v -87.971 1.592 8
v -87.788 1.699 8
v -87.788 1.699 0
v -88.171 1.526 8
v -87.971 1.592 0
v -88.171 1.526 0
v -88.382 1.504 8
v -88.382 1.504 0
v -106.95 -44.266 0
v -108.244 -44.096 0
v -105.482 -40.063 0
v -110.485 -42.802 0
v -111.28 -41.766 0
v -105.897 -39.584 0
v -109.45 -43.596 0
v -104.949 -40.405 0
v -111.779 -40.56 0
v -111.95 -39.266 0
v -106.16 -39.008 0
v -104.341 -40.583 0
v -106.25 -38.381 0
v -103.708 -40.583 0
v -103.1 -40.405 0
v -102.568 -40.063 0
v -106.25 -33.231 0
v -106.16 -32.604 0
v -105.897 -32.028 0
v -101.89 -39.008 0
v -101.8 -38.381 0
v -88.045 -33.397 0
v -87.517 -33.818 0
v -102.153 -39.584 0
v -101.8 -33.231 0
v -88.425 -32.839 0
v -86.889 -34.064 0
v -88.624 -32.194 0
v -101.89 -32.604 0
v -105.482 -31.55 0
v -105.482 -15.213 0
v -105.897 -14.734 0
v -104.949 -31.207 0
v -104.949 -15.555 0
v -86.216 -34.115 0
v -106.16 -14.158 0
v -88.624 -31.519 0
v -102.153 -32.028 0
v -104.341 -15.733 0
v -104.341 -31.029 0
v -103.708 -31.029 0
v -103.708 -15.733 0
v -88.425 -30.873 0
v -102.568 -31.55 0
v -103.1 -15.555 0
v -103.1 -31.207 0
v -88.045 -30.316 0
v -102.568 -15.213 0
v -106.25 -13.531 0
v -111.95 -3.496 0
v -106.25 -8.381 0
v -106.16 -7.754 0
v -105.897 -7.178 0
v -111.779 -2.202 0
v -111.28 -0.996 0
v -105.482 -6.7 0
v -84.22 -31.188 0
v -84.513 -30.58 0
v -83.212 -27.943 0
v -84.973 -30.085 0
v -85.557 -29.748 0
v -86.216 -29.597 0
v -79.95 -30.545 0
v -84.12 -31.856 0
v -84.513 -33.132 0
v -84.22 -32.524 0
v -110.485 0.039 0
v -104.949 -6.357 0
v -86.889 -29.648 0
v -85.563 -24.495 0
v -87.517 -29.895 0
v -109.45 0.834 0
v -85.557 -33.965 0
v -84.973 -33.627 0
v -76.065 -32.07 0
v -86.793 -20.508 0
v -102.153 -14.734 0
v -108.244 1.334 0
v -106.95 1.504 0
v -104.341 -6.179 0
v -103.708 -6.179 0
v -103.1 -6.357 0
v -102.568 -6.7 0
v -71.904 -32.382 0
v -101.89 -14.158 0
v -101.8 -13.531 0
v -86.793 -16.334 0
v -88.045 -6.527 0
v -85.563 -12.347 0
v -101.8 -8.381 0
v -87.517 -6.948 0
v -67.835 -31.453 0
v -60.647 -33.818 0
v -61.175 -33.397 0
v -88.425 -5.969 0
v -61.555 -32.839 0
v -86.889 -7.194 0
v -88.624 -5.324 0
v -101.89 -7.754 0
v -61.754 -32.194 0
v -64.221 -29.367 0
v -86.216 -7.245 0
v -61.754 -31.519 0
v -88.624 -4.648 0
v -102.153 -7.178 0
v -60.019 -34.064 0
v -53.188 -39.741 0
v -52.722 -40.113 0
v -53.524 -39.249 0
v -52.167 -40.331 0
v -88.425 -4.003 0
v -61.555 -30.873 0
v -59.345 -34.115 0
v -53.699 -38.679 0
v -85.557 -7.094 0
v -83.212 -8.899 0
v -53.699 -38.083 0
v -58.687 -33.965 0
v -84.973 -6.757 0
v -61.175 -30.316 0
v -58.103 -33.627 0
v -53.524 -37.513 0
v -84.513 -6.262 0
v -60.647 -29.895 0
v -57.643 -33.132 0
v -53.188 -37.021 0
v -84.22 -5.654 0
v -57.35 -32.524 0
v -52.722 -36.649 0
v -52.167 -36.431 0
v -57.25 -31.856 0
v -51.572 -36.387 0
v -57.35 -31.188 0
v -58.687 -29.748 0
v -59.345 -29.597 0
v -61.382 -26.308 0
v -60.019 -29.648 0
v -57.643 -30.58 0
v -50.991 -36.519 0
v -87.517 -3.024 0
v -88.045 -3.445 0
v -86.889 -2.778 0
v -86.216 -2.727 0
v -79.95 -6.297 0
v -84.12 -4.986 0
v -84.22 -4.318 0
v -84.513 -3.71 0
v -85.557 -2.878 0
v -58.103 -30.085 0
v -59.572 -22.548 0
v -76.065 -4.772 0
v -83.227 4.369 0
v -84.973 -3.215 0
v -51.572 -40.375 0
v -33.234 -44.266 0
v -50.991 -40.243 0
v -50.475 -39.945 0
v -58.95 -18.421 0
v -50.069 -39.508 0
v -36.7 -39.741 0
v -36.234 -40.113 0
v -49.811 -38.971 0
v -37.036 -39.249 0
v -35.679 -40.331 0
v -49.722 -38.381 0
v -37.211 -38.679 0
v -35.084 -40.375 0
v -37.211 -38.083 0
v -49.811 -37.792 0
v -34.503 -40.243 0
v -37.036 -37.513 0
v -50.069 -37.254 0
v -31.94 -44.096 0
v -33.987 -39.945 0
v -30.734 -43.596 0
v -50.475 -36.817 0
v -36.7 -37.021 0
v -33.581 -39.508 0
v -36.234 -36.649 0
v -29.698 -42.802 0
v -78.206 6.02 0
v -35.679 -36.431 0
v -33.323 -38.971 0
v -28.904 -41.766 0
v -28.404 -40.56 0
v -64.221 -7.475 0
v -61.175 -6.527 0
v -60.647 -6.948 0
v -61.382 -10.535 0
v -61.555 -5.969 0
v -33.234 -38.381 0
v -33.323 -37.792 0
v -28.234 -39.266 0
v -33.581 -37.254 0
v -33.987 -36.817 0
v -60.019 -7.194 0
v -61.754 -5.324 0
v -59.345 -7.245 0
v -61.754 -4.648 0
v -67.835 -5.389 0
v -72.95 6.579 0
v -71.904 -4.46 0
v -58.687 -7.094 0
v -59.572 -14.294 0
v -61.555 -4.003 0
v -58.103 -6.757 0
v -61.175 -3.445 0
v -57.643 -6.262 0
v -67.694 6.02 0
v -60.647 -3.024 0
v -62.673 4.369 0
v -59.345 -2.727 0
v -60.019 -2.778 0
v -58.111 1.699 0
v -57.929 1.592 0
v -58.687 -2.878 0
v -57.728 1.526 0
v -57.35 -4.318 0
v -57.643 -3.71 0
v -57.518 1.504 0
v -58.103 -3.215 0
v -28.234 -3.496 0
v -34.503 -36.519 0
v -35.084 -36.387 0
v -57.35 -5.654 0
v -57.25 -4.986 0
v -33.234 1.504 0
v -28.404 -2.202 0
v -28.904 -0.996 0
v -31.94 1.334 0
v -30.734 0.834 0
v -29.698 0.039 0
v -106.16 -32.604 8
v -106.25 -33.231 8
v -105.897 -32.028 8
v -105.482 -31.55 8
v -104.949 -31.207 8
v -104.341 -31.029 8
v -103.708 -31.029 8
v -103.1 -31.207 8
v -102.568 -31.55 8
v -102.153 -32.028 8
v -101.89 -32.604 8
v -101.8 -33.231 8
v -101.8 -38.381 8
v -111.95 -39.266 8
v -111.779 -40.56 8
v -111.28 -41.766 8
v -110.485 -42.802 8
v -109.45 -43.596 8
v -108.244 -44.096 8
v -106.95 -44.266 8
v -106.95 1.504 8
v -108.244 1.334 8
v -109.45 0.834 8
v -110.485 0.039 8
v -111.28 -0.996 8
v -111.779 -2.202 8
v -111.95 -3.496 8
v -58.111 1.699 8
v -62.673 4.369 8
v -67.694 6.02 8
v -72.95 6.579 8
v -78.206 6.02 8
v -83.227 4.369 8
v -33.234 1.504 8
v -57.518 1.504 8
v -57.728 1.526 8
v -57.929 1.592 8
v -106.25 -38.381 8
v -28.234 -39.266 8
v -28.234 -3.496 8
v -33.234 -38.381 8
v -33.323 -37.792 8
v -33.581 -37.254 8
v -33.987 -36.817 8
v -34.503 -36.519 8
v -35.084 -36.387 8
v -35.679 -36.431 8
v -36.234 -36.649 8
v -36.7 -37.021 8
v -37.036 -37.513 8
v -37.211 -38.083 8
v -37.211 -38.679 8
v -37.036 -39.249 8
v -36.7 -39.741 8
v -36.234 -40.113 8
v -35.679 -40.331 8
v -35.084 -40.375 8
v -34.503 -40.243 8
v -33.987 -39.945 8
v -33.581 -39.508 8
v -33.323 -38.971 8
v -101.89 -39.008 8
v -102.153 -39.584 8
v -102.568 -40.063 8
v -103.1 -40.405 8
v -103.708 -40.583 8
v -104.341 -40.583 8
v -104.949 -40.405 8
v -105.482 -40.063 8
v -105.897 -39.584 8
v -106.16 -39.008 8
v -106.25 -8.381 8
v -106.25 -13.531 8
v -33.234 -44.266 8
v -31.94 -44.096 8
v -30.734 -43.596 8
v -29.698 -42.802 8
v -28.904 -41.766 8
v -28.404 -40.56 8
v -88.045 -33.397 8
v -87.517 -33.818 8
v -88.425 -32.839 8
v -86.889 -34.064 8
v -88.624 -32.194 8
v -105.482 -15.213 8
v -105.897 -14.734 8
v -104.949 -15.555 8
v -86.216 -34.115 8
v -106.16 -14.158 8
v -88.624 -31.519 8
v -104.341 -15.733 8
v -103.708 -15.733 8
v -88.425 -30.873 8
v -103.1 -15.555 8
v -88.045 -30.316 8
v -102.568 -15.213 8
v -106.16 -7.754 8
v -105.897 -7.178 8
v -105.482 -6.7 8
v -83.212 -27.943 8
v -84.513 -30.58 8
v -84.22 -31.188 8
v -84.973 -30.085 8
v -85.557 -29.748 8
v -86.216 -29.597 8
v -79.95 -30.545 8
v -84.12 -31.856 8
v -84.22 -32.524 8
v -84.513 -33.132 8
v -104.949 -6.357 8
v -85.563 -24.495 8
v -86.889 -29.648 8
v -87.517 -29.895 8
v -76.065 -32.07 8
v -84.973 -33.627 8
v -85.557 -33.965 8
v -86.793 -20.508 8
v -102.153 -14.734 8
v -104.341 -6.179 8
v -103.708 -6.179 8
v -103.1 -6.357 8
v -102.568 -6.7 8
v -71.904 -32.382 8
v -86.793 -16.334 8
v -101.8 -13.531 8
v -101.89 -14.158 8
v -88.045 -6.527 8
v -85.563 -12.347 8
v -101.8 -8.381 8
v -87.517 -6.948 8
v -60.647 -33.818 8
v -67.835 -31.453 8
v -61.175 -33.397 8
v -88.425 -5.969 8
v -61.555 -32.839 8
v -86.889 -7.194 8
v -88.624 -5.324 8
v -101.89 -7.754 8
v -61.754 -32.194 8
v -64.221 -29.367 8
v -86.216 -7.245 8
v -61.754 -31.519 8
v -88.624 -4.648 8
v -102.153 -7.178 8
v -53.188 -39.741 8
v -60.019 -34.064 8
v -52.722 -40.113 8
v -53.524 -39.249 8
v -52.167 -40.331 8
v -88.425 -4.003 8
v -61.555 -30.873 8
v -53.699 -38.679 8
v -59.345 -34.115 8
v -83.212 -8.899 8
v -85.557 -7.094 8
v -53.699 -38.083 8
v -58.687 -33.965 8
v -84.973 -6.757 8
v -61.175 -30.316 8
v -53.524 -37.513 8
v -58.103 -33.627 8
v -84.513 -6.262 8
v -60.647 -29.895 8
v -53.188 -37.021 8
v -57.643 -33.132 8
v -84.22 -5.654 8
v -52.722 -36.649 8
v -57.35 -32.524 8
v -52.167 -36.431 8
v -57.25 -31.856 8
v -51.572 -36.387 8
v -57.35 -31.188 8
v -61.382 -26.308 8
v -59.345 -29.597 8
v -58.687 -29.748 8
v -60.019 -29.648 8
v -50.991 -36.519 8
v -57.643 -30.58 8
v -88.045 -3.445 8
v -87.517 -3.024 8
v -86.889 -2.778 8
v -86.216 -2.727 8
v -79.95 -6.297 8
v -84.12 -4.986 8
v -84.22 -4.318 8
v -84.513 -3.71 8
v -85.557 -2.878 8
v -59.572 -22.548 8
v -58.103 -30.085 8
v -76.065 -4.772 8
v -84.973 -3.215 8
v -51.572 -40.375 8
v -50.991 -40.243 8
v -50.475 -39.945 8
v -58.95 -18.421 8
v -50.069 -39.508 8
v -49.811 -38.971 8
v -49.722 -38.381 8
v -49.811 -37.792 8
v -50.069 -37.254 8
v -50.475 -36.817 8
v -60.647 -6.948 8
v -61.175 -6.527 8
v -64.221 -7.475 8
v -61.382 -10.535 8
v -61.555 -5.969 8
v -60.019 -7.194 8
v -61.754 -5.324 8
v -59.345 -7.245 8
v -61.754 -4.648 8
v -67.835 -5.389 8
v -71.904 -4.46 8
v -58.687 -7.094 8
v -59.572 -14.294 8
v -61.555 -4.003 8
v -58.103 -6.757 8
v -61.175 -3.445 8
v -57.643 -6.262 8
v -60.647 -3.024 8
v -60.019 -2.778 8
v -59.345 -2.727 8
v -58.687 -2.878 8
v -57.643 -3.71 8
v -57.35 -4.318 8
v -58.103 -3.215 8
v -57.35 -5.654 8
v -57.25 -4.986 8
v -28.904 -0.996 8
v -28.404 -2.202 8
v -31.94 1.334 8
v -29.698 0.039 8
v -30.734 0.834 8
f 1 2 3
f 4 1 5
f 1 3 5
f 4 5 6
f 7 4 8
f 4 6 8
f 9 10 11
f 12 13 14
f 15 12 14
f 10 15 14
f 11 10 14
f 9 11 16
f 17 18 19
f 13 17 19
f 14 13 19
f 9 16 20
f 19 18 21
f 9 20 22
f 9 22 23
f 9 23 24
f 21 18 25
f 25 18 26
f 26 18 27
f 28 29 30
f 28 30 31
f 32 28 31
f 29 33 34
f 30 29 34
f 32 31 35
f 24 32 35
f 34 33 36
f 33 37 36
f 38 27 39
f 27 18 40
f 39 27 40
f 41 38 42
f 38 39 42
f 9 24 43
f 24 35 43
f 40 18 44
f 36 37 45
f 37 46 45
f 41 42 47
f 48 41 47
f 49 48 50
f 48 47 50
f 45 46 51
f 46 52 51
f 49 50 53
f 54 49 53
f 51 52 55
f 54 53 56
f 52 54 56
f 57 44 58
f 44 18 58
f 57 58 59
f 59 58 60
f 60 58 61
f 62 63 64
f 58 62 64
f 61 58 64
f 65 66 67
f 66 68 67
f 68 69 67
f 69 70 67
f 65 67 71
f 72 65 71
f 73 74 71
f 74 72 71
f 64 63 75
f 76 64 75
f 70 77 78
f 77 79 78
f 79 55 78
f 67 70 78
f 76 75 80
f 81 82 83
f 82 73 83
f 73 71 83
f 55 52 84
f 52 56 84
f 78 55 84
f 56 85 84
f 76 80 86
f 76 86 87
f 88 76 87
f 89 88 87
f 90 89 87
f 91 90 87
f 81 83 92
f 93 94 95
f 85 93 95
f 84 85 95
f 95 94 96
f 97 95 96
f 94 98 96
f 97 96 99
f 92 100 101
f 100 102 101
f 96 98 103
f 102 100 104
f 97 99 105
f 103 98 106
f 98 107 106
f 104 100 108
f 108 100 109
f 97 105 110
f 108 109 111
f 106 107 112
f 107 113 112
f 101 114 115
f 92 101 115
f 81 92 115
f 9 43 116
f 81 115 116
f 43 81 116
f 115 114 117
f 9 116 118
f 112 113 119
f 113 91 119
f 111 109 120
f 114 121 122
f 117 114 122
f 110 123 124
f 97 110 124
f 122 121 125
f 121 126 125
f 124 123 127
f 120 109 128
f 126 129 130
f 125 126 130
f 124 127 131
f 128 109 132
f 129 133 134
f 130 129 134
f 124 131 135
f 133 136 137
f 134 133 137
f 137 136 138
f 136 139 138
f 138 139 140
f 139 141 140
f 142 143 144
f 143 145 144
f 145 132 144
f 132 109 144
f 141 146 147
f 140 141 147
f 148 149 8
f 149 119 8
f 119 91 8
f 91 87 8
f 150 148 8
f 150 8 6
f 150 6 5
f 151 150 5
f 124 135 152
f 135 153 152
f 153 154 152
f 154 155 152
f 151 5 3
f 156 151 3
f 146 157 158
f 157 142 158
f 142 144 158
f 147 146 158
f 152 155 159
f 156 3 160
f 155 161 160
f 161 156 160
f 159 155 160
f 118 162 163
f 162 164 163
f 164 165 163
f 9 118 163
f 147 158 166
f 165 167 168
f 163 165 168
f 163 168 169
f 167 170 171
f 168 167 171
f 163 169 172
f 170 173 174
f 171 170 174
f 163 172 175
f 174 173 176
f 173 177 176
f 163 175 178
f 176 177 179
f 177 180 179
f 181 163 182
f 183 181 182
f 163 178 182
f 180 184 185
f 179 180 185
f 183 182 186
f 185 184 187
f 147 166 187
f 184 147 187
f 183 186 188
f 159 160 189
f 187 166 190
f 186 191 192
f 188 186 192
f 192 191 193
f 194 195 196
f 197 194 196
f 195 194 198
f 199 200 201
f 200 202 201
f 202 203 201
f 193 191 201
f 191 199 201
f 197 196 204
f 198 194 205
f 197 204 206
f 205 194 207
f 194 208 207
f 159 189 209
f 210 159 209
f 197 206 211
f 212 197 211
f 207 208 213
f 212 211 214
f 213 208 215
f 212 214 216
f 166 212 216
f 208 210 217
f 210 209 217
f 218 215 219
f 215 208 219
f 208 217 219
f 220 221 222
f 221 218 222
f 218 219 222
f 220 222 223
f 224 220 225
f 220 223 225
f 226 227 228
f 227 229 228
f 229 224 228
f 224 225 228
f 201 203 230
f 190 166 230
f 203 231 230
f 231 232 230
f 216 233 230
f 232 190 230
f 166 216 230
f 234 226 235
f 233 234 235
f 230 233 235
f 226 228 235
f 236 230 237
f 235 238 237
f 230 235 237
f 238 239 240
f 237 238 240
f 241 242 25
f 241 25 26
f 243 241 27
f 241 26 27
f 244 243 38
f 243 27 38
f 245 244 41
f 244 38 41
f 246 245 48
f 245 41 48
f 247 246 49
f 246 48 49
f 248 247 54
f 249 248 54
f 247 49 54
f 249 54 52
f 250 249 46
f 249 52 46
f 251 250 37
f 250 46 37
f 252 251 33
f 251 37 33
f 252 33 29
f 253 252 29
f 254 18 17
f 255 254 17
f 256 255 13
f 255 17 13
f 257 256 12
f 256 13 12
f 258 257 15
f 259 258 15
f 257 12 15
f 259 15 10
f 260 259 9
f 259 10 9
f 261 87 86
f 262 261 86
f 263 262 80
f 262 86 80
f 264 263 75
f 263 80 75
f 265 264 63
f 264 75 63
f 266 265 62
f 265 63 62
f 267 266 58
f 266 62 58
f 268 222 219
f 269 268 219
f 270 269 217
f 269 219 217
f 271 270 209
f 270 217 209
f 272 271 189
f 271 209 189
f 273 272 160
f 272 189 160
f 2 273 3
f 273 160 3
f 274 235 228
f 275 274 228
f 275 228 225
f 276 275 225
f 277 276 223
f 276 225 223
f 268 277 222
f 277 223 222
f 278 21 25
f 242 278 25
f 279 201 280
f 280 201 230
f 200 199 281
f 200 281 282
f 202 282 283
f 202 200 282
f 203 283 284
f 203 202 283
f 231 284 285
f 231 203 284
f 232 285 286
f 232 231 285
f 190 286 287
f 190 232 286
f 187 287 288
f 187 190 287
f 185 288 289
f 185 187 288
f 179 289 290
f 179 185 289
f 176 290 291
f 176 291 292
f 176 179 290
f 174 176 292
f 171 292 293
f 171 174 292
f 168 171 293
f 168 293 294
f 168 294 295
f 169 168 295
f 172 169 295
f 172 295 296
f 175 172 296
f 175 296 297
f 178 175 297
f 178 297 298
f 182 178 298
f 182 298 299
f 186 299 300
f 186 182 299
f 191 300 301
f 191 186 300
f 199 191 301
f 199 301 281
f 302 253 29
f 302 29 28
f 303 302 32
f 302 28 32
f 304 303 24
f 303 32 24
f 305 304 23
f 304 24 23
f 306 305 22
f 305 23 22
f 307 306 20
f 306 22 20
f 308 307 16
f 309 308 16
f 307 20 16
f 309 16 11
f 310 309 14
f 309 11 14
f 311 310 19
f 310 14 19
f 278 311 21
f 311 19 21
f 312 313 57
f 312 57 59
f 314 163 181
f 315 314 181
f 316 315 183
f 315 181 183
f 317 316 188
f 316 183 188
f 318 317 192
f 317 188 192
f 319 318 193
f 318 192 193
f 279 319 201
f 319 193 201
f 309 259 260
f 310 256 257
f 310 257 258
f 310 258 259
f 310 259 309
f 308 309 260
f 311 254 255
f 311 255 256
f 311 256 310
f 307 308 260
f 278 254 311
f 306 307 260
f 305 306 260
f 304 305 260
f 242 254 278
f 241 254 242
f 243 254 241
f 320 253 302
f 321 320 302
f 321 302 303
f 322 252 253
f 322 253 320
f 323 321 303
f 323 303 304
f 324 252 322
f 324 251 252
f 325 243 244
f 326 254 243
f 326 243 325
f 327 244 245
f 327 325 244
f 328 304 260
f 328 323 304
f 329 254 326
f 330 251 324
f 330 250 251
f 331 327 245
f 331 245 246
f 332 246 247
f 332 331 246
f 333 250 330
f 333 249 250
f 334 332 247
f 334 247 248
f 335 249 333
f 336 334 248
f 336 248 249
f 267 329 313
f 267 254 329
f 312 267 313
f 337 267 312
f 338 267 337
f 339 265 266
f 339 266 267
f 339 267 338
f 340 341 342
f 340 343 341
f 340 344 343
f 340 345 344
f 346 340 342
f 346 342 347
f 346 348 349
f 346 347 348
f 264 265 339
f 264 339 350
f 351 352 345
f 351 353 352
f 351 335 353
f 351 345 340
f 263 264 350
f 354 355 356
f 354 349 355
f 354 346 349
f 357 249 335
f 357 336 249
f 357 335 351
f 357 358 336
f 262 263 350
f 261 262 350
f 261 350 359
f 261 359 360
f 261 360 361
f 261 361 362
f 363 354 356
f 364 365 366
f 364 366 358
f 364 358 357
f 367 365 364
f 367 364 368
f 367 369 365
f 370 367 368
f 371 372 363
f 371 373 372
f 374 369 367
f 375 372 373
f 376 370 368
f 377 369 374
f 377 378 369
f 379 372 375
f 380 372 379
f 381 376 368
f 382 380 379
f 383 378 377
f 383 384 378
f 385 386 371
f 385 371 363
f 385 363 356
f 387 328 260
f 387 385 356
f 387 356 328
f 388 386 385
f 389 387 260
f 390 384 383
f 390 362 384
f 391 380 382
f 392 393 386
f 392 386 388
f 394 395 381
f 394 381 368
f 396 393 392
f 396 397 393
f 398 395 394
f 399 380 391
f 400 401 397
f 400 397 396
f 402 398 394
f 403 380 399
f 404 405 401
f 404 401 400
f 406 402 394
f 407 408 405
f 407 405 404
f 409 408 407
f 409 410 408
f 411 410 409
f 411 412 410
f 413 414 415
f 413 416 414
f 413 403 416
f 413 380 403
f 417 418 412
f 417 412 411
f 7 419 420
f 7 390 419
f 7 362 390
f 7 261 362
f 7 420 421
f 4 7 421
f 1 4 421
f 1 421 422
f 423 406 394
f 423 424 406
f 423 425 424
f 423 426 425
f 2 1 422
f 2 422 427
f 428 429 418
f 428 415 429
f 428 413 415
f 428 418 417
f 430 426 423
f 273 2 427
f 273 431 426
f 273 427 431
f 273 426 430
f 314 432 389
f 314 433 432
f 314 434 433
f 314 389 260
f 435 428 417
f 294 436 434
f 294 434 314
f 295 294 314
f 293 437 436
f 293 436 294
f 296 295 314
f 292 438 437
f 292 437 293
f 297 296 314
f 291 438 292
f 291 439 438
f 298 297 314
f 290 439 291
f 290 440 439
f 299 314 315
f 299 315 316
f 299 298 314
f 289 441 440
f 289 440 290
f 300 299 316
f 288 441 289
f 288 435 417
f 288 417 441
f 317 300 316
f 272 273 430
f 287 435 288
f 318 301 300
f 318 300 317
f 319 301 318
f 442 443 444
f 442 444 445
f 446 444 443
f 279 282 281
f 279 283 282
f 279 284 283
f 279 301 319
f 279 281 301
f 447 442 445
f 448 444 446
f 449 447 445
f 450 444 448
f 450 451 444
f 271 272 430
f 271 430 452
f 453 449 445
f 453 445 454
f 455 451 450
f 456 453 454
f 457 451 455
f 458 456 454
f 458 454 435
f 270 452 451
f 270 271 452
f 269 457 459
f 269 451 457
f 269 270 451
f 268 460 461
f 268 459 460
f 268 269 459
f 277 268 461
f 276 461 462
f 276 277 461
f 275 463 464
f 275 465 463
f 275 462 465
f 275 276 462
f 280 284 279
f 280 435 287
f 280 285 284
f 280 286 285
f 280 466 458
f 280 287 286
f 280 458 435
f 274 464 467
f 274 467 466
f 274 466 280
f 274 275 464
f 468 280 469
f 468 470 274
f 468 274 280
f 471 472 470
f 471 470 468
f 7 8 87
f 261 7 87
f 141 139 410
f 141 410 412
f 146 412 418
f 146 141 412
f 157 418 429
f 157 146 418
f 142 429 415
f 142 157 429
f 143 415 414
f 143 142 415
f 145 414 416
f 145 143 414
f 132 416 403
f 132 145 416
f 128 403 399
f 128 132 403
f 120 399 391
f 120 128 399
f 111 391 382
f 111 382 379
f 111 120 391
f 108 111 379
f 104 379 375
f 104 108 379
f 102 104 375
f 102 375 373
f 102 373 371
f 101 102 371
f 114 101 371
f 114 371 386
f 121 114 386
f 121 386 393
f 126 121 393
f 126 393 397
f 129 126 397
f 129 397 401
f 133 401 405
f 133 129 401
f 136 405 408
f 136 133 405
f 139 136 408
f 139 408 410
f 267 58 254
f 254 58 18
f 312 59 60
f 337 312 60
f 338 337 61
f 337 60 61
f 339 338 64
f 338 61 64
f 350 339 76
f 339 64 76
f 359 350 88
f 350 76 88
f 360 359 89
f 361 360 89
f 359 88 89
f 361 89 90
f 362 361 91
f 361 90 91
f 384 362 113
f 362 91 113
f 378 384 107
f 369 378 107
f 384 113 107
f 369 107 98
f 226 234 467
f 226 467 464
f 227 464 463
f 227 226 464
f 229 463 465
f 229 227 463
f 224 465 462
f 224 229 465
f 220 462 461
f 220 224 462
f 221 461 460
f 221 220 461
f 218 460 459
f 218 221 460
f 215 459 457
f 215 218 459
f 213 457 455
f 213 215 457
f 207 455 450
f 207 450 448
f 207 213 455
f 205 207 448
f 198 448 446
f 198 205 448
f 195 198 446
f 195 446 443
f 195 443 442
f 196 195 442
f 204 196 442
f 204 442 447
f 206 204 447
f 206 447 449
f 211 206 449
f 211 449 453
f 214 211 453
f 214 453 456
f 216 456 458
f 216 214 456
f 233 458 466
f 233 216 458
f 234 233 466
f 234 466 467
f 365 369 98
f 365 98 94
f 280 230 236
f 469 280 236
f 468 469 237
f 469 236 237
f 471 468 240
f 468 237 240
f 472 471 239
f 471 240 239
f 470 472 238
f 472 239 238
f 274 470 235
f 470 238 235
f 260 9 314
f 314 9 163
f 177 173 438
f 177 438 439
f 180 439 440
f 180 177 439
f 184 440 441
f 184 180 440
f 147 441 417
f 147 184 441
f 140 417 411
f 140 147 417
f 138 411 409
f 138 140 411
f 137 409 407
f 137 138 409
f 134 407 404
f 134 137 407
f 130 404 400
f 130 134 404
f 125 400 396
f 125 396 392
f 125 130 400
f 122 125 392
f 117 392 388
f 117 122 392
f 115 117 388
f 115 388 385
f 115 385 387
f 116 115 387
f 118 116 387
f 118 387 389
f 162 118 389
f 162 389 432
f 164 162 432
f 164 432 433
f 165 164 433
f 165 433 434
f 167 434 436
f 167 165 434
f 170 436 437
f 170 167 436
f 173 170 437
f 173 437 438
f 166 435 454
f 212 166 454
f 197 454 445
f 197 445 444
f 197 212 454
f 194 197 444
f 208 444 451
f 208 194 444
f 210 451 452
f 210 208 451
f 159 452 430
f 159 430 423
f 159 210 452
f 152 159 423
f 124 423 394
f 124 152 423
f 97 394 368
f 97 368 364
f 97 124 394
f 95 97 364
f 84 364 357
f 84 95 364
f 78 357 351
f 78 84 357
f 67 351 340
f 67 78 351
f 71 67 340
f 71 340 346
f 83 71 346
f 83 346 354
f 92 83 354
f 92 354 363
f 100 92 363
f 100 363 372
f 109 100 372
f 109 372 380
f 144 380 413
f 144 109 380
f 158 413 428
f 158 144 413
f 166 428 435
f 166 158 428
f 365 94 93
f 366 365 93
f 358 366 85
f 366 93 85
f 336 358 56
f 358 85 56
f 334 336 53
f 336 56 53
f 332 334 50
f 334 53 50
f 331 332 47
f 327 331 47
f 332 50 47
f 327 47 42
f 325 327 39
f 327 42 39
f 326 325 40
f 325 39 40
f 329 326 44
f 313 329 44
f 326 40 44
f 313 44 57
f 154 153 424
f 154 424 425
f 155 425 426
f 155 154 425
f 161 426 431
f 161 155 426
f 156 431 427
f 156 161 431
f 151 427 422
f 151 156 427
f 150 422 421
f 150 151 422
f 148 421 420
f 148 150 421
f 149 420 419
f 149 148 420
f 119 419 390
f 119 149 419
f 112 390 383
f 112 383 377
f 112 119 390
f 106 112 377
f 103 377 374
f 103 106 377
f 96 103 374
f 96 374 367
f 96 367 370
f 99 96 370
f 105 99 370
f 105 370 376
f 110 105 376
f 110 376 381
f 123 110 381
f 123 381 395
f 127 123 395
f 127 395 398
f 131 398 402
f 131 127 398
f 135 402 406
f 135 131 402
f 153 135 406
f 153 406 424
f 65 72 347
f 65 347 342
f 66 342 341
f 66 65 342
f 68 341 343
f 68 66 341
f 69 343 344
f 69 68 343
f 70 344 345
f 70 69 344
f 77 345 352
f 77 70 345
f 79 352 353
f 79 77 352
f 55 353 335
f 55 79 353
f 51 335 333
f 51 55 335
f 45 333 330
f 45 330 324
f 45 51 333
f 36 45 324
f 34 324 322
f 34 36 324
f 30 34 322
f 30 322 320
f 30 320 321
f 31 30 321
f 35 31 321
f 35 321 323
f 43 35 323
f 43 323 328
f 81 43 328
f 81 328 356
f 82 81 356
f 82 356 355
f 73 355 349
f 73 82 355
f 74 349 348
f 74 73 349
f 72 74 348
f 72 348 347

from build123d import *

# Parameters (mm, degrees)
F0_R     = 2.265
F0_R_2   = 2
F0_R_3   = 14
F1_DEPTH = 8


with BuildPart() as f1:
    # F0 (on Top) → F1 (new body)
    with BuildSketch(Plane.XY):
        with BuildLine():
            Line((-88.381675, 1.503936), (-106.949748, 1.503936))
            ThreePointArc((-106.949748, 1.503936), (-110.485281, 0.03947), (-111.949748, -3.496064))
            Line((-111.949748, -3.496064), (-111.949748, -39.266064))
            ThreePointArc((-111.949748, -39.266064), (-110.485281, -42.801598), (-106.949748, -44.266064))
            Line((-106.949748, -44.266064), (-84.717208, -44.266064))
            Line((-84.717208, -44.266064), (-33.233784, -44.266064))
            ThreePointArc((-33.233784, -44.266064), (-29.69825, -42.801598), (-28.233784, -39.266064))
            Line((-28.233784, -39.266064), (-28.233784, -3.496064))
            ThreePointArc((-28.233784, -3.496064), (-29.69825, 0.03947), (-33.233784, 1.503936))
            Line((-33.233784, 1.503936), (-57.51782, 1.503936))
            ThreePointArc((-57.51782, 1.503936), (-57.830224, 1.553986), (-58.111356, 1.699128))
            ThreePointArc((-58.111356, 1.699128), (-72.949748, 6.578936), (-87.788139, 1.699128))
            ThreePointArc((-87.788139, 1.699128), (-88.069271, 1.553986), (-88.381675, 1.503936))
        make_face()
        with BuildLine():
            Line((-101.799748, -33.231064), (-101.799748, -38.381064))
            ThreePointArc((-101.799748, -38.381064), (-104.024748, -40.606064), (-106.249748, -38.381064))
            Line((-106.249748, -38.381064), (-106.249748, -33.231064))
            ThreePointArc((-106.249748, -33.231064), (-104.024748, -31.006064), (-101.799748, -33.231064))
        make_face(mode=Mode.SUBTRACT)
        with Locations((-86.384776, -31.856093)):
            Circle(F0_R, mode=Mode.SUBTRACT)
        with Locations((-59.514719, -31.856093)):
            Circle(F0_R, mode=Mode.SUBTRACT)
        with Locations((-51.721655, -38.381064)):
            Circle(F0_R_2, mode=Mode.SUBTRACT)
        with Locations((-35.233784, -38.381064)):
            Circle(F0_R_2, mode=Mode.SUBTRACT)
        with Locations((-72.949748, -18.421064)):
            Circle(F0_R_3, mode=Mode.SUBTRACT)
        with BuildLine():
            Line((-106.249748, -13.531064), (-106.249748, -8.381064))
            ThreePointArc((-106.249748, -8.381064), (-104.024748, -6.156064), (-101.799748, -8.381064))
            Line((-101.799748, -8.381064), (-101.799748, -13.531064))
            ThreePointArc((-101.799748, -13.531064), (-104.024748, -15.756064), (-106.249748, -13.531064))
        make_face(mode=Mode.SUBTRACT)
        with Locations((-86.384776, -4.986036)):
            Circle(F0_R, mode=Mode.SUBTRACT)
        with Locations((-59.514719, -4.986036)):
            Circle(F0_R, mode=Mode.SUBTRACT)
    extrude(amount=F1_DEPTH)


solid = f1.part
